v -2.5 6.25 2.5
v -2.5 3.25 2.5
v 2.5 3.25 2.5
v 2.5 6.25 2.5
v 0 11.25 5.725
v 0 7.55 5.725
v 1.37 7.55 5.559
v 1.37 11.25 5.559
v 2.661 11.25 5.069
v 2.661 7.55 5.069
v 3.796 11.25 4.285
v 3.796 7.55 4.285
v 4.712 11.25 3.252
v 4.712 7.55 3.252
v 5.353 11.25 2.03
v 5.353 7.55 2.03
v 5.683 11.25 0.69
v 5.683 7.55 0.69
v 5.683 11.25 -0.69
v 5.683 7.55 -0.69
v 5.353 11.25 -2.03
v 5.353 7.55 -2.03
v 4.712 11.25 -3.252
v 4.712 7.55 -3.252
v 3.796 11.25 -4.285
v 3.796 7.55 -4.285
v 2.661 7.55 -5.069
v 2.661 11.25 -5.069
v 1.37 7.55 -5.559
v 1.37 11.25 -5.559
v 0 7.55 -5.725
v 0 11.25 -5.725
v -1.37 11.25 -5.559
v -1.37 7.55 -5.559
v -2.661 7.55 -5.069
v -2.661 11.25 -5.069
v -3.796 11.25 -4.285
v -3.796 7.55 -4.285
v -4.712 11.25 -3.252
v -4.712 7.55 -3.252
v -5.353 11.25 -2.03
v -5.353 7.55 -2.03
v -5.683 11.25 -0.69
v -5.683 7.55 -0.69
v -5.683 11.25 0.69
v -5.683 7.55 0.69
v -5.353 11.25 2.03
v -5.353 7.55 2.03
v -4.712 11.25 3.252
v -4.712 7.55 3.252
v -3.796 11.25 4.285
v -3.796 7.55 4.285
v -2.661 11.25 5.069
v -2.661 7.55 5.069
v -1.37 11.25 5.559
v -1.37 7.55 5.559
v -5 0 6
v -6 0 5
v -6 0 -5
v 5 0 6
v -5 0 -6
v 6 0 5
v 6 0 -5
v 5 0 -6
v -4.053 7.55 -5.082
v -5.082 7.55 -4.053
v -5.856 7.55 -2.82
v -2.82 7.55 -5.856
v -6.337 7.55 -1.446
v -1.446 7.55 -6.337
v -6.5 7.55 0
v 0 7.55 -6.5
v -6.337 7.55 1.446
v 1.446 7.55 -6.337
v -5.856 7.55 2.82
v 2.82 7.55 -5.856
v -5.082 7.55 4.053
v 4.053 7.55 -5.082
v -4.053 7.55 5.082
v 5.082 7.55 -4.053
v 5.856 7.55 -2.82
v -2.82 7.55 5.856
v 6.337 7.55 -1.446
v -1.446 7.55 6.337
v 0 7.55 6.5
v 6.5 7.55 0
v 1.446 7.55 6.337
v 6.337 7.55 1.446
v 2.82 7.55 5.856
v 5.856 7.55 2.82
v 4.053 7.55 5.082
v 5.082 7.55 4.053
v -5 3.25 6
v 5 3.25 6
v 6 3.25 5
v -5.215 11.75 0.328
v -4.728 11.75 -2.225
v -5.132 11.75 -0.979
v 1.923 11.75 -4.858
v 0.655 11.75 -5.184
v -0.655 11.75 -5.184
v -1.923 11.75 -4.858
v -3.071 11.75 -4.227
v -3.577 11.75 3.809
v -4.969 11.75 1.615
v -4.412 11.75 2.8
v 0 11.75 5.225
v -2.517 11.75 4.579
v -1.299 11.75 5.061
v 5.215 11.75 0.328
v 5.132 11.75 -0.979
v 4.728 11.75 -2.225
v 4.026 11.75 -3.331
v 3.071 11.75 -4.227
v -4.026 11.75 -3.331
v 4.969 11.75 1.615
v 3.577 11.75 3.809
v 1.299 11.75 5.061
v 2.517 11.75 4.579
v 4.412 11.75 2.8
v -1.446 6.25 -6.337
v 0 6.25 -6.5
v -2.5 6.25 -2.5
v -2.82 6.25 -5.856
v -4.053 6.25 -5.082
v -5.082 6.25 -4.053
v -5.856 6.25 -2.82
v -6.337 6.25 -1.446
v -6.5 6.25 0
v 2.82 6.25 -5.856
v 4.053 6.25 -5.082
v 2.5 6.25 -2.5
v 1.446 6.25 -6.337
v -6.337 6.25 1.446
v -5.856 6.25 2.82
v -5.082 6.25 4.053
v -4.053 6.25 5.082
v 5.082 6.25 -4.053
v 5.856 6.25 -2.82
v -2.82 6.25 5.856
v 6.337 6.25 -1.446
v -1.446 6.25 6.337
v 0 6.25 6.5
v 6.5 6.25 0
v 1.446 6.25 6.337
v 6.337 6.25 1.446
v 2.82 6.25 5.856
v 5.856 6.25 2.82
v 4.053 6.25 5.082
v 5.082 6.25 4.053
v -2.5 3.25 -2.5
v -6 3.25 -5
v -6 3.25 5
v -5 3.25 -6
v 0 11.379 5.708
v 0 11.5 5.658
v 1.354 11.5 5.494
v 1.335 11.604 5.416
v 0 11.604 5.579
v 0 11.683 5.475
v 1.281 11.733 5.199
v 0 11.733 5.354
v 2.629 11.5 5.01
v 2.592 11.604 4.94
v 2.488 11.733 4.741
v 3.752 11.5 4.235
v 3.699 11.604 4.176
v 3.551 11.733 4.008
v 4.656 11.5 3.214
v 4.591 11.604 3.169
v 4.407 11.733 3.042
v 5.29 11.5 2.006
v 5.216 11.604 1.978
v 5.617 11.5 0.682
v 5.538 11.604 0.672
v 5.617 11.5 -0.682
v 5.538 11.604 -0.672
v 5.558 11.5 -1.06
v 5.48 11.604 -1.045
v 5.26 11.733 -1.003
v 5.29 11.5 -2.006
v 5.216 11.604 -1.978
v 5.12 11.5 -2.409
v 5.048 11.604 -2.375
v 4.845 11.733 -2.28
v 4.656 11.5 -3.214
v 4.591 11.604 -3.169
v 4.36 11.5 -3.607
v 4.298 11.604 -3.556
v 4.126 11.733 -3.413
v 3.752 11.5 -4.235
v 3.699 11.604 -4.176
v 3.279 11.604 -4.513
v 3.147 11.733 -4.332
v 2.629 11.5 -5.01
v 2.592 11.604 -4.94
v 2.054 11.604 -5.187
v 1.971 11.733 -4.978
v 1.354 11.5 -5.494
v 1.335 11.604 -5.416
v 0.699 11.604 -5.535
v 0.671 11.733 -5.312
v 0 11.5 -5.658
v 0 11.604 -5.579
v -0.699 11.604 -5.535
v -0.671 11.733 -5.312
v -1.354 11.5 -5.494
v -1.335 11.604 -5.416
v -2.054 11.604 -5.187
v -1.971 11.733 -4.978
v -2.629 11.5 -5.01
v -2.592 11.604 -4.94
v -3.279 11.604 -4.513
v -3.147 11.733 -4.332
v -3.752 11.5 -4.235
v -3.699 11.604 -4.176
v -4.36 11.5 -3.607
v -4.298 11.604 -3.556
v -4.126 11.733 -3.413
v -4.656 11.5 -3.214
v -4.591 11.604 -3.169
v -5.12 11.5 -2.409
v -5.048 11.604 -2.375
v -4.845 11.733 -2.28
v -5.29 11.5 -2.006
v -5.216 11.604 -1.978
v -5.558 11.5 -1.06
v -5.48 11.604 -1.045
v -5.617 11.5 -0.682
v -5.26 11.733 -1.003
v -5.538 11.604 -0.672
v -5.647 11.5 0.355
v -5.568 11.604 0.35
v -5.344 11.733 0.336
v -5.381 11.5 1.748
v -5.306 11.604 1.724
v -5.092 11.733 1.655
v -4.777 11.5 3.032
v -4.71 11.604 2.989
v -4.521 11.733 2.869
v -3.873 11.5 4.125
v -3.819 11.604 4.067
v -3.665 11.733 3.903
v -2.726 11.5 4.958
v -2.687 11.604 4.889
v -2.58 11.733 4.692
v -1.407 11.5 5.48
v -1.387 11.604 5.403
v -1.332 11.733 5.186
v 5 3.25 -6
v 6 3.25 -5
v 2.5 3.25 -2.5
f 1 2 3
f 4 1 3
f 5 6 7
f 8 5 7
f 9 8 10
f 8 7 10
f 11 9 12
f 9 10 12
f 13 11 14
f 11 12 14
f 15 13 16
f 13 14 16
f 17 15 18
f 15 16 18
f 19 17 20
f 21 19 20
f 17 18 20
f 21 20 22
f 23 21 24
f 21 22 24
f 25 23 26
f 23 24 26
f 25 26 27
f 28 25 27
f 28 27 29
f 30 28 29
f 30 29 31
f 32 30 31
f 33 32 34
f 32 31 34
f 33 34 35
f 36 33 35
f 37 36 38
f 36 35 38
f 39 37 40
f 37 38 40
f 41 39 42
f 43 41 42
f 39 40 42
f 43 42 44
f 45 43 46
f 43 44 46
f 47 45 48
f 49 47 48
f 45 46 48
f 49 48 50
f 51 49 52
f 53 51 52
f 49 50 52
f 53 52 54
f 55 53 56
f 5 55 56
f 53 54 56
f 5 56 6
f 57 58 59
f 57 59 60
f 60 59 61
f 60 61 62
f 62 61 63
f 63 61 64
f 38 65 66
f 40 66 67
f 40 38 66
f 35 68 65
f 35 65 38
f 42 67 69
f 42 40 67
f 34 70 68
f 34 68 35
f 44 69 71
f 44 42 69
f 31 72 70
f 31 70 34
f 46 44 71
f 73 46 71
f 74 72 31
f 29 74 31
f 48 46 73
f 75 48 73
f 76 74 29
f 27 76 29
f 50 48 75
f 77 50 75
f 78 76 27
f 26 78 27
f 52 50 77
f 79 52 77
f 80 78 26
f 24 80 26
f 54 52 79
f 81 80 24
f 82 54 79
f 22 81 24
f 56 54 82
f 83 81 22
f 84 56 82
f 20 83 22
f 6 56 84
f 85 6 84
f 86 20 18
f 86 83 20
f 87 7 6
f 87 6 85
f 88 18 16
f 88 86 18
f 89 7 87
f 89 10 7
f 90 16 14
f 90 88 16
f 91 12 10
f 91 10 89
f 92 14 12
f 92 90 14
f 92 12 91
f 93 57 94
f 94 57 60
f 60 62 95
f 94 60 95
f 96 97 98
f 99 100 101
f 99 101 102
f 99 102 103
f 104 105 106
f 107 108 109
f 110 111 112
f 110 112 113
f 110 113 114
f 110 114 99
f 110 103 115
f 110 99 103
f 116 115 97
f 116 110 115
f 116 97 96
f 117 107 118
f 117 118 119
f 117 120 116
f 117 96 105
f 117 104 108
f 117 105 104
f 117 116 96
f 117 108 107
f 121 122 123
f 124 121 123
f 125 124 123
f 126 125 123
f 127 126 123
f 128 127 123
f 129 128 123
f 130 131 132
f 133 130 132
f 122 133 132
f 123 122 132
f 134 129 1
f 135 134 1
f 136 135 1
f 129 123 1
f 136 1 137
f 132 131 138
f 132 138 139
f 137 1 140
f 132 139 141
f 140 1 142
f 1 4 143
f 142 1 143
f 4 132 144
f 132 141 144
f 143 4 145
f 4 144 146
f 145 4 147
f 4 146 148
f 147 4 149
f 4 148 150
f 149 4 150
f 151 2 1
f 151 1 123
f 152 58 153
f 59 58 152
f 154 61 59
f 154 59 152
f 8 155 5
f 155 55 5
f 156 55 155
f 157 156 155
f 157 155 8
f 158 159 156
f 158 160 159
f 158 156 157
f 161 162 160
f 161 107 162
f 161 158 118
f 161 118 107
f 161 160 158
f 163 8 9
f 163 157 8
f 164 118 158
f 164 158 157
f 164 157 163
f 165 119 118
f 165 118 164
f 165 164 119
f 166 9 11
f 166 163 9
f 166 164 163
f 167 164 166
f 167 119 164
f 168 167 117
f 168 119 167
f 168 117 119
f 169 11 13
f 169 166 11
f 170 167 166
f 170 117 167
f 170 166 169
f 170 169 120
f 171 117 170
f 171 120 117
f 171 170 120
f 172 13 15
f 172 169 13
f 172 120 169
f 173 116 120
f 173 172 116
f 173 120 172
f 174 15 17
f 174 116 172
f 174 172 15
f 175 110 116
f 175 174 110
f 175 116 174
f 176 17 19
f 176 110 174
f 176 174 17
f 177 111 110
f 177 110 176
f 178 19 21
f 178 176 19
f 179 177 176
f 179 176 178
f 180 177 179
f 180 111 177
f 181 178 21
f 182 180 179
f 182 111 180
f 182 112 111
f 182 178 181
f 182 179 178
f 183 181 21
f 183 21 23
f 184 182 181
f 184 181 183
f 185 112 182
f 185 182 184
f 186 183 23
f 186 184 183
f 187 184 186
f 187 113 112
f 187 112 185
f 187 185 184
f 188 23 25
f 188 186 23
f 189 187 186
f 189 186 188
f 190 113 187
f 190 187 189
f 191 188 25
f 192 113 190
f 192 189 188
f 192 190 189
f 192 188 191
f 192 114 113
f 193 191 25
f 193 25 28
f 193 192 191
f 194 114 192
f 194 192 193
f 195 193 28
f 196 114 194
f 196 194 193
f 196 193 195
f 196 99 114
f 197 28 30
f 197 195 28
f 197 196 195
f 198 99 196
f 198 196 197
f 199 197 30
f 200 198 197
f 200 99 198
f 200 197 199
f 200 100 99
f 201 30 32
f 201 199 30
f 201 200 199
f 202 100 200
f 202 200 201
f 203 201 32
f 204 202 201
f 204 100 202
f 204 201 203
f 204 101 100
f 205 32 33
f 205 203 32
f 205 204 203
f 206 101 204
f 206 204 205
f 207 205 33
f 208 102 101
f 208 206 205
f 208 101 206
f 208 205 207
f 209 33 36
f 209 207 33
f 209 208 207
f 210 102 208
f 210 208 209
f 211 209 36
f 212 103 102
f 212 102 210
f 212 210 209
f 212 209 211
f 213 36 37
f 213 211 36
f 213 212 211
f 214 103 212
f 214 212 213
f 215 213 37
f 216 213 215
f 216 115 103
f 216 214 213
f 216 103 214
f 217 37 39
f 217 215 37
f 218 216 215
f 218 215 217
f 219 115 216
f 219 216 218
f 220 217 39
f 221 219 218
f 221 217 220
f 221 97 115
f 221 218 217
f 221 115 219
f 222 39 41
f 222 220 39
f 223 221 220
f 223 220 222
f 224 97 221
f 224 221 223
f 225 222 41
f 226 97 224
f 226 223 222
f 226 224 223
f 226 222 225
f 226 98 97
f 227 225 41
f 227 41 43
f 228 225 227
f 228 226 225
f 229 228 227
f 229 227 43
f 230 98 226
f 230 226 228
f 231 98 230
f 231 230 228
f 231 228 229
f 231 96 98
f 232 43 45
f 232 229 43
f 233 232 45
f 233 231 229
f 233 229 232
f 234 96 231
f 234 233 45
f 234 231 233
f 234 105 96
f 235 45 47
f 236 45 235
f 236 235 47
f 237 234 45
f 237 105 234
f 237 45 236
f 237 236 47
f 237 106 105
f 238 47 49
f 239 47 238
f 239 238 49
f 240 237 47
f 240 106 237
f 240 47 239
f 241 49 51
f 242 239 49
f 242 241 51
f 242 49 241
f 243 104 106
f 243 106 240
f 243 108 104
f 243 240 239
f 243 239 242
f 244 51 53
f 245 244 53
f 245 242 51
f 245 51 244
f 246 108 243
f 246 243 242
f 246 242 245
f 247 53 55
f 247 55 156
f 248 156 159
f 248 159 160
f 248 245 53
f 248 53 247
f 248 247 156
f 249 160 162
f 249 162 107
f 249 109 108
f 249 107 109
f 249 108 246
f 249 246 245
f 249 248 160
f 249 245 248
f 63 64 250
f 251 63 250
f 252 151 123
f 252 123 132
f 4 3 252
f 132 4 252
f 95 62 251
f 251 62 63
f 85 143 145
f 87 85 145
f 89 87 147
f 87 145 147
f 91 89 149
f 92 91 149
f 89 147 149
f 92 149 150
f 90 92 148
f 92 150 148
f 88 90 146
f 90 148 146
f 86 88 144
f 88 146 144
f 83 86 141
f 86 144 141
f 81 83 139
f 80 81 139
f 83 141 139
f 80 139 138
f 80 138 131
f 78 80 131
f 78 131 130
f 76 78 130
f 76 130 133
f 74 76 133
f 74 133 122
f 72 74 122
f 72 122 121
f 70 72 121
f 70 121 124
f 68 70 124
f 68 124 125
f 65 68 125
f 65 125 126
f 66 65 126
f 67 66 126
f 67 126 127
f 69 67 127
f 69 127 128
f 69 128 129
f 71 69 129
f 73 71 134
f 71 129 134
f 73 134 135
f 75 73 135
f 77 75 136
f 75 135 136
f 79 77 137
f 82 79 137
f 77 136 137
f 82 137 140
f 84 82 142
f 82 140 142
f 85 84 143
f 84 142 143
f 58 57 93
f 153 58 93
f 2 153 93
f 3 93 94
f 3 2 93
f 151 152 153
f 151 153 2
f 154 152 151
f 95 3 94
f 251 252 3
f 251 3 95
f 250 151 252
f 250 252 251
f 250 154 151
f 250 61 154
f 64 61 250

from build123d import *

# Parameters (mm, degrees)
SKETCH1_W           = 12
SKETCH1_H           = 12
BOSS_EXTRUDE1_DEPTH = 3.25
CHAMFER1_SIZE       = 1
SKETCH2_W           = 5
SKETCH2_H           = 5
BOSS_EXTRUDE2_DEPTH = 3
SKETCH3_R           = 6.5
BOSS_EXTRUDE3_DEPTH = 5.5
CUT_EXTRUDE1_START  = -4.2
SKETCH4_R           = 6.5
SKETCH4_R_2         = 5.725
CUT_EXTRUDE1_DEPTH  = 4.2
FILLET1_R           = 0.5


with BuildPart() as part:
    # Sketch1 → Boss-Extrude1 (new body)
    with BuildSketch(Plane(origin=(0, 0, 0), x_dir=(1, 0, 0), z_dir=(0, 1, 0))):
        Rectangle(SKETCH1_W, SKETCH1_H)
    extrude(amount=BOSS_EXTRUDE1_DEPTH)

    # Chamfer1
    chamfer1_edges = [part.edges().sort_by_distance(p)[0] for p in [
        (-6, 1.625, -6),
        (6, 1.625, -6),
        (6, 1.625, 6),
        (-6, 1.625, 6),
    ]]
    chamfer(chamfer1_edges, length=CHAMFER1_SIZE)

    # Sketch2 → Boss-Extrude2 (add)
    with BuildSketch(Plane(origin=(0, 3.25, 0), x_dir=(1, 0, 0), z_dir=(0, 1, 0))):
        Rectangle(SKETCH2_W, SKETCH2_H)
    extrude(amount=BOSS_EXTRUDE2_DEPTH)

    # Sketch3 → Boss-Extrude3 (add)
    with BuildSketch(Plane(origin=(0, 6.25, 0), x_dir=(1, 0, 0), z_dir=(0, 1, 0))):
        with Locations(Location((0, 0, 0), (0, 0, 270))):
            Circle(SKETCH3_R)
    extrude(amount=BOSS_EXTRUDE3_DEPTH)

    # Sketch4 → Cut-Extrude1 (cut)
    with BuildSketch(Plane(origin=(0, 11.75, 0), x_dir=(1, 0, 0), z_dir=(0, 1, 0)).offset(CUT_EXTRUDE1_START)):
        with Locations(Location((0, 0, 0), (0, 0, 270))):
            Circle(SKETCH4_R)
        with Locations(Location((0, 0, 0), (0, 0, 270))):
            Circle(SKETCH4_R_2, mode=Mode.SUBTRACT)
    extrude(amount=CUT_EXTRUDE1_DEPTH, mode=Mode.SUBTRACT)

    # Fillet1
    fillet1_edges = [part.edges().sort_by_distance(p)[0] for p in [
        (0, 11.75, -5.725),
    ]]
    fillet(fillet1_edges, radius=FILLET1_R)


solid = part.part
